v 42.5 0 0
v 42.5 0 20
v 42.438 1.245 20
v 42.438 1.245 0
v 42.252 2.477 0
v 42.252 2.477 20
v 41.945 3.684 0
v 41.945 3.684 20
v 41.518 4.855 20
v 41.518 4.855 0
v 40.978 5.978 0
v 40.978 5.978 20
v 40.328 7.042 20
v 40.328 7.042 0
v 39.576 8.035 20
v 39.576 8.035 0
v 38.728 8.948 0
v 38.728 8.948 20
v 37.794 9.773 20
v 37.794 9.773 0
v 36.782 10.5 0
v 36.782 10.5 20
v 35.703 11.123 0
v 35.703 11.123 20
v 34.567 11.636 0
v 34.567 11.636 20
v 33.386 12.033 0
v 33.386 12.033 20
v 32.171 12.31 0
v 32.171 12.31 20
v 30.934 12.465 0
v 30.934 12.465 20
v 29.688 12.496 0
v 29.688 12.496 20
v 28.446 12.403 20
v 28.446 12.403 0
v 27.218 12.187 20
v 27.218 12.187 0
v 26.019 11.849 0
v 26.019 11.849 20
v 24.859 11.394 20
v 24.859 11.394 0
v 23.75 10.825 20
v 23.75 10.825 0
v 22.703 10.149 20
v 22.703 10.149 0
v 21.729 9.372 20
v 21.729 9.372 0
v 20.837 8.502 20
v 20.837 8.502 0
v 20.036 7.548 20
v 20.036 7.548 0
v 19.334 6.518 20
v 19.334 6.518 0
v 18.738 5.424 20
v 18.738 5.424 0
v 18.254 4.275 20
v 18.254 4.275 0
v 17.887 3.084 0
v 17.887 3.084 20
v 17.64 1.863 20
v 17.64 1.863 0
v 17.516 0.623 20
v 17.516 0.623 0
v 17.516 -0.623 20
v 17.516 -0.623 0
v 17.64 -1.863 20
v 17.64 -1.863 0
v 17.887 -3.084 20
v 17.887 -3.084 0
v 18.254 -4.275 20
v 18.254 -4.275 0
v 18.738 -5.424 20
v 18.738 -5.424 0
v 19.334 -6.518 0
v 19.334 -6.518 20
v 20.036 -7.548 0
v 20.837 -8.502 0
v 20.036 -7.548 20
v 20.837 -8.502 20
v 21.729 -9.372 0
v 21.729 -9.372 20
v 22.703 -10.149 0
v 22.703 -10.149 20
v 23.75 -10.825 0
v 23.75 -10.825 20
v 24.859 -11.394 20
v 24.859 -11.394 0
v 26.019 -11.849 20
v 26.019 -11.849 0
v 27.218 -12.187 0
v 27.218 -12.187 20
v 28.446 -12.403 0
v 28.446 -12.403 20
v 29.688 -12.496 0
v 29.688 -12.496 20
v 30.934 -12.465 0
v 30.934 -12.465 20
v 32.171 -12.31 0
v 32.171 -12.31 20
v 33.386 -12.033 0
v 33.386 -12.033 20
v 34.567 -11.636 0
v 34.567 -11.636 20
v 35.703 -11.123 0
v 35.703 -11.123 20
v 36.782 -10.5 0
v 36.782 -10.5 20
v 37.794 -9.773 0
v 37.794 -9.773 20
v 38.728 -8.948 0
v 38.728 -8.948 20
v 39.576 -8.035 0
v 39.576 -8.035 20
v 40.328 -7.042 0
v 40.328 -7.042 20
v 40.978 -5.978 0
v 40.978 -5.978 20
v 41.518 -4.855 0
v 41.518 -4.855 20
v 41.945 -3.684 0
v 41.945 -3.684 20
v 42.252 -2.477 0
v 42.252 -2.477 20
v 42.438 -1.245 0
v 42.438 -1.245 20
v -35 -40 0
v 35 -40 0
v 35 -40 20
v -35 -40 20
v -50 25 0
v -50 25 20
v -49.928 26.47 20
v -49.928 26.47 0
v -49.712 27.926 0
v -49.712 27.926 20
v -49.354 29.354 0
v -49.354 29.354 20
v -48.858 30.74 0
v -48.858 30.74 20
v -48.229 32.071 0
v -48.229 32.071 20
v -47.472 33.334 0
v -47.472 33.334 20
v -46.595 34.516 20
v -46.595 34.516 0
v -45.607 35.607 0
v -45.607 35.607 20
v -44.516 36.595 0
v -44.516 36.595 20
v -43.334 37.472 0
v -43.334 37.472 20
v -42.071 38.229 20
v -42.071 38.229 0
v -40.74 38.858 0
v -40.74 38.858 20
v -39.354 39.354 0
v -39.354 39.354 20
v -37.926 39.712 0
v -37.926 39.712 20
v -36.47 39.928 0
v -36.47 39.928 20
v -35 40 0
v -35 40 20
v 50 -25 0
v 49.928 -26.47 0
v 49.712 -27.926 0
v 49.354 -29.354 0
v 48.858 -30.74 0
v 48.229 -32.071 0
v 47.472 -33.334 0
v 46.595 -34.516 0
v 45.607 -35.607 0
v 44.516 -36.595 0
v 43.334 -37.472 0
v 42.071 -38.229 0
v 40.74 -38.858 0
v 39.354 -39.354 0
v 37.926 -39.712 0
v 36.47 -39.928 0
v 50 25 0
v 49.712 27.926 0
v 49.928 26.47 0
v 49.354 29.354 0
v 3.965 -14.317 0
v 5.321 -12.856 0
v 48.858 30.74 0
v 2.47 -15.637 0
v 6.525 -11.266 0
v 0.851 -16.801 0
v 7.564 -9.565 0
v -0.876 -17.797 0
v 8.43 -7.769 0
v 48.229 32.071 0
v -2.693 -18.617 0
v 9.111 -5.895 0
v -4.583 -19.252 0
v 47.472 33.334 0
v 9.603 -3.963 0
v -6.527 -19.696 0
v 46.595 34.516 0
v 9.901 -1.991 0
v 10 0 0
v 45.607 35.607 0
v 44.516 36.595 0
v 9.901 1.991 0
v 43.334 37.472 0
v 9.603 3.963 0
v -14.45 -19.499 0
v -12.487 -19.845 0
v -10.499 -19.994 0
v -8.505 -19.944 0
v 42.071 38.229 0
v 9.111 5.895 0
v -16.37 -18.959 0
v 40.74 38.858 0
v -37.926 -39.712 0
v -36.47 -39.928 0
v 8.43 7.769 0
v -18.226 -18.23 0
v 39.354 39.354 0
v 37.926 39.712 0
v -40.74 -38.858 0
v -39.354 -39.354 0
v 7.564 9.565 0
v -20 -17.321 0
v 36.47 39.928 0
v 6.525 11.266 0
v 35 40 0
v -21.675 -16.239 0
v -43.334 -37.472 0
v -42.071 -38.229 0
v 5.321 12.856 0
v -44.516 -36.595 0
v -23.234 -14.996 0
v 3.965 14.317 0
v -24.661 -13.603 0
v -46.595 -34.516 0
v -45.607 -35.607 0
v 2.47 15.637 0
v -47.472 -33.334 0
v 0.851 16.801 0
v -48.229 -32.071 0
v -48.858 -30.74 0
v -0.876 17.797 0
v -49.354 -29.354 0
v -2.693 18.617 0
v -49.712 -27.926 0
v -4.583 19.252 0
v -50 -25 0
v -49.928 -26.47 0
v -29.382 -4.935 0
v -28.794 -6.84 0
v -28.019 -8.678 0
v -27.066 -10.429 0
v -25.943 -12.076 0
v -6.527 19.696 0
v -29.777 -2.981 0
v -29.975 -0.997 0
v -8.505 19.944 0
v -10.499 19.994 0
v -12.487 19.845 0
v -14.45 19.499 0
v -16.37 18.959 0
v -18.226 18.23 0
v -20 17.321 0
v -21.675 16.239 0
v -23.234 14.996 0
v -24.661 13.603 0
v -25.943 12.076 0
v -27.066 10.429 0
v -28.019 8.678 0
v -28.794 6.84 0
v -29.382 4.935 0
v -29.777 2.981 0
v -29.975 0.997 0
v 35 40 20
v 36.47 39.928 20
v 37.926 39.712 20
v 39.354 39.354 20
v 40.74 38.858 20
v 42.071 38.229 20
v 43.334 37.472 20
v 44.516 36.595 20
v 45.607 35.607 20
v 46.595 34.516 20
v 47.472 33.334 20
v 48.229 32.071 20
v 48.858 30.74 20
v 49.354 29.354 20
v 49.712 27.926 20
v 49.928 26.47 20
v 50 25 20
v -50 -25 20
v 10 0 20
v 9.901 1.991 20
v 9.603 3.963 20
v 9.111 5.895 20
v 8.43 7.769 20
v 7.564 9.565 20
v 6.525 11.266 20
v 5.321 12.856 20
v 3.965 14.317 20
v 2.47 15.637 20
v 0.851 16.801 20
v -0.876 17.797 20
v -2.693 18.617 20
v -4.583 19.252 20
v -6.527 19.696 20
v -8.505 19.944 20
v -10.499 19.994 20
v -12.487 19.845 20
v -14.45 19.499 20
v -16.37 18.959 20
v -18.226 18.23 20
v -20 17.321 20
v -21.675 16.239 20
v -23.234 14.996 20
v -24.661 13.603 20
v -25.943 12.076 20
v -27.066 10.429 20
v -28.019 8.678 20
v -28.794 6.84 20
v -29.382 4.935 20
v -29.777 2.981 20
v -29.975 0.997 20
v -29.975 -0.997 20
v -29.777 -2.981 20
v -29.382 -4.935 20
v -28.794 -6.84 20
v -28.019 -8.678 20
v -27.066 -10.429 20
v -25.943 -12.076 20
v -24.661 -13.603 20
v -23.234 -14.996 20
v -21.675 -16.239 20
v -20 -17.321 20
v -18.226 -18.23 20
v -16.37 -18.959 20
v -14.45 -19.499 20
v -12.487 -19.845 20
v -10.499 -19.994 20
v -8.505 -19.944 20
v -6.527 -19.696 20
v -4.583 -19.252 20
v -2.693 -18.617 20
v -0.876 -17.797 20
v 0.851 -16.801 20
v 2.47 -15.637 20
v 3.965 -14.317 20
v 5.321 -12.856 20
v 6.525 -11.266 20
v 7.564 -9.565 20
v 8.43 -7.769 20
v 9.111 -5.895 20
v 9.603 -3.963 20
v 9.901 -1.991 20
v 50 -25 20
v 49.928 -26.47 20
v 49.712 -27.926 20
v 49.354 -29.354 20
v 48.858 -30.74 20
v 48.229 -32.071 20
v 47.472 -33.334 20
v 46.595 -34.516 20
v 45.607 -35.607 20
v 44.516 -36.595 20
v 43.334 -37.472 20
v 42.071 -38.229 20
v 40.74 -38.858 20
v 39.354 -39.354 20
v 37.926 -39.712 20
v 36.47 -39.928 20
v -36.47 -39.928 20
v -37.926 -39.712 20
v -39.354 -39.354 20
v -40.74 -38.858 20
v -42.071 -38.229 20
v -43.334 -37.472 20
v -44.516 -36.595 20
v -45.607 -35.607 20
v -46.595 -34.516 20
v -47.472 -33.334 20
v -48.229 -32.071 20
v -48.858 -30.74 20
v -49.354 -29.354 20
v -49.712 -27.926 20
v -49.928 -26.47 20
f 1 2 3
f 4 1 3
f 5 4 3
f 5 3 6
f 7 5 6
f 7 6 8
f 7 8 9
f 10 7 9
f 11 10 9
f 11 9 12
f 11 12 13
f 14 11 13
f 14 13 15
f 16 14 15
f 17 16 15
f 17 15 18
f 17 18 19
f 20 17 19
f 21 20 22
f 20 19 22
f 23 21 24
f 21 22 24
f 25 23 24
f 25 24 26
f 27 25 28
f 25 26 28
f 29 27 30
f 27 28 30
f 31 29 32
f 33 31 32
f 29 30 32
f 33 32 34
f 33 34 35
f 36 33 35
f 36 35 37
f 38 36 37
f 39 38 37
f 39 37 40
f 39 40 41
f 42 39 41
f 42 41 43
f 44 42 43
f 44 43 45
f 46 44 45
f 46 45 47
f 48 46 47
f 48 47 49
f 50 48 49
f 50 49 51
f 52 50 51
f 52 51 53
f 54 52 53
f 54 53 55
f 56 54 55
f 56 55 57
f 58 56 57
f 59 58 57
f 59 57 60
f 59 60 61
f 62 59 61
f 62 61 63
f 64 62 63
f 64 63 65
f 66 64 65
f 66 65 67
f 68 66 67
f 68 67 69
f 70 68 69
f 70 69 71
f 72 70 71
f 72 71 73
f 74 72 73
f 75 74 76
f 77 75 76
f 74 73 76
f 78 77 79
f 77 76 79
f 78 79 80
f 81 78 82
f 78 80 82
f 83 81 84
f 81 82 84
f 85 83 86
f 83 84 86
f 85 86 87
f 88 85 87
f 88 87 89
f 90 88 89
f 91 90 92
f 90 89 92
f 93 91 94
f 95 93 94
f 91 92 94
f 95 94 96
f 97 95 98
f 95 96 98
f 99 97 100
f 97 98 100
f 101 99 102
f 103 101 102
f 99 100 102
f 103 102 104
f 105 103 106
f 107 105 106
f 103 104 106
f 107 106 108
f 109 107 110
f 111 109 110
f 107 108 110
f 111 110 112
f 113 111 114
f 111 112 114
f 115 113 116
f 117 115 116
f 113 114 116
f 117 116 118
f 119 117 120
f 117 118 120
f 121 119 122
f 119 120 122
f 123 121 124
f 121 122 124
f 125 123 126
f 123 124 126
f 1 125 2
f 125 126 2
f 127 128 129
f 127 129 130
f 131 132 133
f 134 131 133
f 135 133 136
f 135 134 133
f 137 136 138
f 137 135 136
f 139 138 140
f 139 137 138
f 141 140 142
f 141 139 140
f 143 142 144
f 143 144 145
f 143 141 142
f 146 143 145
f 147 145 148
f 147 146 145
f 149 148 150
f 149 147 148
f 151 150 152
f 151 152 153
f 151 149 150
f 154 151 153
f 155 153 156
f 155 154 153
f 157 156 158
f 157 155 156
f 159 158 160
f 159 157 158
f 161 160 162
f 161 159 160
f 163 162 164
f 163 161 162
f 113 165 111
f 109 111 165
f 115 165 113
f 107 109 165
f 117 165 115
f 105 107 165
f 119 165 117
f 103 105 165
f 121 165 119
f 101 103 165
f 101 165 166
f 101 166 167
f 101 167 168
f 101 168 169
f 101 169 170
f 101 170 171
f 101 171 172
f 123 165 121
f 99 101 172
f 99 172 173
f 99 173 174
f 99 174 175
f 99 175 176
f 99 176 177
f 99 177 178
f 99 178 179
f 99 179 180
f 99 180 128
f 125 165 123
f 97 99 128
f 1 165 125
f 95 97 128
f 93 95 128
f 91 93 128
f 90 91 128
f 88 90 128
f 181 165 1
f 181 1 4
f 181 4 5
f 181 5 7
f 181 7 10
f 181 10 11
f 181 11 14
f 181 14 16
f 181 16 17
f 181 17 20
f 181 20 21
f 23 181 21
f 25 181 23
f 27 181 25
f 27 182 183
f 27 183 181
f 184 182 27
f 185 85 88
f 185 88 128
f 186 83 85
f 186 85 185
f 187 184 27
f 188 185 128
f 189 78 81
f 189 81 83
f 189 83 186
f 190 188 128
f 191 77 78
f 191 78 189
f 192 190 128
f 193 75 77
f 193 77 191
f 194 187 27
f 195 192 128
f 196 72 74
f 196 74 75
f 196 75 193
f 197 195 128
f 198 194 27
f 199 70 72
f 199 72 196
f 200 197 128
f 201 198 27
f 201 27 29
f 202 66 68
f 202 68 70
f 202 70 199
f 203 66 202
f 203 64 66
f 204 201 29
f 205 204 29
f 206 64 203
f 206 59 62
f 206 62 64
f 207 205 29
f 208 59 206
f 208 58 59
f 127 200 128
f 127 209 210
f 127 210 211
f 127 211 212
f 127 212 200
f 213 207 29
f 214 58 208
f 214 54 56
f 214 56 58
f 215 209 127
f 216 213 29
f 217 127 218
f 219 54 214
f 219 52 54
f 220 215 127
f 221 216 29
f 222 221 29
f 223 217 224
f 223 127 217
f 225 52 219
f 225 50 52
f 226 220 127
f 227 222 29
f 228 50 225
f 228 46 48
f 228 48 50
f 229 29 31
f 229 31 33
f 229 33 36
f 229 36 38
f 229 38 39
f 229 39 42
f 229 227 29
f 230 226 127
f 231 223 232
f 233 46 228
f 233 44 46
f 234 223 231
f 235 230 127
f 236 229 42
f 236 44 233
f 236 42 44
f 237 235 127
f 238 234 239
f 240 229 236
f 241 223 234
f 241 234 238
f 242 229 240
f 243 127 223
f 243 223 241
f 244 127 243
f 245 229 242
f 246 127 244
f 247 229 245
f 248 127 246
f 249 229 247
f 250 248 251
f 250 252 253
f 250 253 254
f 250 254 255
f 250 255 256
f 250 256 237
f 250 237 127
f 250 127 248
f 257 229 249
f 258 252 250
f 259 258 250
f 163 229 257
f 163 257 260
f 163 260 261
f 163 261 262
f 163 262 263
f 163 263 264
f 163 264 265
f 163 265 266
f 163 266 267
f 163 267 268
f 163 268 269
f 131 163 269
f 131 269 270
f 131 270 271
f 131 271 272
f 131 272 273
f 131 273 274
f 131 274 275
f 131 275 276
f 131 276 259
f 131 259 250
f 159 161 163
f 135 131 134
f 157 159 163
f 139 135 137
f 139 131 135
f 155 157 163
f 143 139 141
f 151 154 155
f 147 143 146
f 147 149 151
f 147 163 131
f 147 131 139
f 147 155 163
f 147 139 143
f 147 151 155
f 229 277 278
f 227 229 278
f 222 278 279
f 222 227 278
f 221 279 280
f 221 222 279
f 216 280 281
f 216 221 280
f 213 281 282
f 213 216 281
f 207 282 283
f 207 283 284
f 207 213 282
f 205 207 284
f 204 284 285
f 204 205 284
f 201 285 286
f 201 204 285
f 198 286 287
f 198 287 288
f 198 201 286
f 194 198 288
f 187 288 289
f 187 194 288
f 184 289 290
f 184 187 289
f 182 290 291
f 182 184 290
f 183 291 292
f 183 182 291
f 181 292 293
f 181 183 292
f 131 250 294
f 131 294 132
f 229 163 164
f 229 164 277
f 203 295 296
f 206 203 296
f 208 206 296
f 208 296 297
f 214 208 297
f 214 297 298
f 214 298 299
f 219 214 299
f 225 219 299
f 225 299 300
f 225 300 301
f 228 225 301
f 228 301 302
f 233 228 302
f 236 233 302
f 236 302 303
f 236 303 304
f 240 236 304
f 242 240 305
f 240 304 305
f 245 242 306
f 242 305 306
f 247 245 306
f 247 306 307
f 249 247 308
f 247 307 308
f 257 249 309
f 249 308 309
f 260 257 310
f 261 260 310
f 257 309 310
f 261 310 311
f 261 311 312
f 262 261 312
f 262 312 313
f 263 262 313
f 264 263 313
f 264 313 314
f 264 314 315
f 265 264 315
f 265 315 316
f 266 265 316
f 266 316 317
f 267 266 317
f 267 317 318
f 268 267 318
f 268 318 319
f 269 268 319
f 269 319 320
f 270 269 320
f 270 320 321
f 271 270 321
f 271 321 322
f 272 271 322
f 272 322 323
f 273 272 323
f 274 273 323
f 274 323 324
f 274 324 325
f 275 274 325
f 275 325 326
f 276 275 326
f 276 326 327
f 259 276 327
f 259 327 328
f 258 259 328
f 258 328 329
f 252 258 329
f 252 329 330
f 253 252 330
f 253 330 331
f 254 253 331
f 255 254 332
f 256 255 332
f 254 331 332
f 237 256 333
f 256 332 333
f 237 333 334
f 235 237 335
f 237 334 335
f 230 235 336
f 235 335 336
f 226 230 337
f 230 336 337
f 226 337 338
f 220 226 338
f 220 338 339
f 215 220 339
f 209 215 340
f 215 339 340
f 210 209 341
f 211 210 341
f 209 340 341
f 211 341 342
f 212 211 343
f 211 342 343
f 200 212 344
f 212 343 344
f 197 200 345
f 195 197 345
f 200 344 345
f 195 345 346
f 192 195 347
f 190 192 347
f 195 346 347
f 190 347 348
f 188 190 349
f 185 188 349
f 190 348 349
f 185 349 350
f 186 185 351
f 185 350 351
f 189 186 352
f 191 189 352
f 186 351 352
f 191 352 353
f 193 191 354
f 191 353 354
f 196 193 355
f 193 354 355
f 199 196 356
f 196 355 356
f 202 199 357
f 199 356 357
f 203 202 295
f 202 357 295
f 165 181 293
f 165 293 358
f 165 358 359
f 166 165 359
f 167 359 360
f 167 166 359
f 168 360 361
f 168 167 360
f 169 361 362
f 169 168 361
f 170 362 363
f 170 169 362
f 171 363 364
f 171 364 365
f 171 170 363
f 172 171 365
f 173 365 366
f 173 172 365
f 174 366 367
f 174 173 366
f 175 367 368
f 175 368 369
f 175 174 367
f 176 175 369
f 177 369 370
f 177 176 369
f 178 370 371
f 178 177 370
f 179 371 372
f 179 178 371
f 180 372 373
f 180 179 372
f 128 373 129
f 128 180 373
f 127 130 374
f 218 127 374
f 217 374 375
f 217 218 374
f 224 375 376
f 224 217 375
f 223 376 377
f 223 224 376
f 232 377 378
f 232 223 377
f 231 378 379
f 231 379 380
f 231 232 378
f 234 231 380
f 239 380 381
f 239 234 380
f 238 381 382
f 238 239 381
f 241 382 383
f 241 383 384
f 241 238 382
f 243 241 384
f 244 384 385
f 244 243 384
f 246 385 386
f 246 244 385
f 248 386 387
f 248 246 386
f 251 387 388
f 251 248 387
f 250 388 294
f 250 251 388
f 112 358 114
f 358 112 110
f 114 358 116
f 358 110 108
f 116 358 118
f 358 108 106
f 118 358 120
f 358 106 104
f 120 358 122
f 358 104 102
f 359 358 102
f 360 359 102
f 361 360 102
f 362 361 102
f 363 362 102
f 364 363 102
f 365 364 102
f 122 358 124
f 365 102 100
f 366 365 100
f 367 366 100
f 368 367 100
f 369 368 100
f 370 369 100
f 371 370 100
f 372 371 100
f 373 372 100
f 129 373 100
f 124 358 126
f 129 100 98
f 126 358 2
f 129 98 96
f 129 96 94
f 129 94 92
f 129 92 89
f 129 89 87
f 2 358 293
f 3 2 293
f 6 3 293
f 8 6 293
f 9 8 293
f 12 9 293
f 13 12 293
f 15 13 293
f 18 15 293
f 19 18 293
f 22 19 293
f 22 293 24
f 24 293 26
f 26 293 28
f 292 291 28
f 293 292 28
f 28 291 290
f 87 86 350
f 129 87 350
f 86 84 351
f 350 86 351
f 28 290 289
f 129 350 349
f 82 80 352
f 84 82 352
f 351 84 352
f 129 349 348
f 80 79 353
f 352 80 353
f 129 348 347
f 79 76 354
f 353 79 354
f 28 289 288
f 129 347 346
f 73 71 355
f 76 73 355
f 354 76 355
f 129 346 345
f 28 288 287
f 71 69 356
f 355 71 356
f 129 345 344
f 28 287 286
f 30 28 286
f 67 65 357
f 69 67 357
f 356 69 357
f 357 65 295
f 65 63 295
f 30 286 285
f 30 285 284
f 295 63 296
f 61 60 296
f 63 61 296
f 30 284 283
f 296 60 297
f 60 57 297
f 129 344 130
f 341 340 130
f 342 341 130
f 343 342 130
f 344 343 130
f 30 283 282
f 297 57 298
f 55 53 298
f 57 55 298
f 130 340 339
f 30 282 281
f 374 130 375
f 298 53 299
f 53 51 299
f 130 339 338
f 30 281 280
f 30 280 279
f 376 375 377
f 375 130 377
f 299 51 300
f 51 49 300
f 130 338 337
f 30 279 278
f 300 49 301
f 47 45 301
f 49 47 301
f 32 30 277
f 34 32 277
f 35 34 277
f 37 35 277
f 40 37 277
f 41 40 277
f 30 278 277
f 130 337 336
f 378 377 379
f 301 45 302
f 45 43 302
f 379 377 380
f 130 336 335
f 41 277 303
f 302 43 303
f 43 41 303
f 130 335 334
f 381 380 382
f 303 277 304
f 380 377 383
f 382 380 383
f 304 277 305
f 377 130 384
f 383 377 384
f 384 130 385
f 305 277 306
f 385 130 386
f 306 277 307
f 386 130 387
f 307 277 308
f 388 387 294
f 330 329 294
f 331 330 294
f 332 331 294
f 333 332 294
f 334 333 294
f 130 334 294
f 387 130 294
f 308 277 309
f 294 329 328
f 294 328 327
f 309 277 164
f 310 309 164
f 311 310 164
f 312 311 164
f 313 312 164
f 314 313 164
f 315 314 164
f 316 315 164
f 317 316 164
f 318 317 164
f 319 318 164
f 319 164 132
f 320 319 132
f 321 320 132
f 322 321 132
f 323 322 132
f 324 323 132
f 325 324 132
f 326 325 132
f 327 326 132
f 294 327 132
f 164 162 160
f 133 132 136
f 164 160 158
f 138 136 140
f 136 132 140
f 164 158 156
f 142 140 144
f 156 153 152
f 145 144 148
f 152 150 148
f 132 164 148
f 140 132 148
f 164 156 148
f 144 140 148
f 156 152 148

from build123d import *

# Parameters (mm, degrees)
BOSS_EXTRUDE1_DEPTH     = 20
SKETCH3_R               = 20
CUT_EXTRUDE2_DEPTH      = 1
CUT_EXTRUDE2_DEPTH_BACK = 21
SKETCH4_R               = 12.5
CUT_EXTRUDE3_DEPTH      = 21


with BuildPart() as part:
    # Sketch1 → Boss-Extrude1 (new body)
    with BuildSketch(Plane.XY):
        with BuildLine():
            Line((35, -40), (-35, -40))
            ThreePointArc((-35, -40), (-45.606601718, -35.606601718), (-50, -25))
            Line((-50, -25), (-50, 25))
            ThreePointArc((-50, 25), (-45.606601718, 35.606601718), (-35, 40))
            Line((-35, 40), (35, 40))
            ThreePointArc((35, 40), (45.606601718, 35.606601718), (50, 25))
            Line((50, 25), (50, -25))
            ThreePointArc((50, -25), (45.606601718, -35.606601718), (35, -40))
        make_face()
    extrude(amount=BOSS_EXTRUDE1_DEPTH)

    # Sketch3 → Cut-Extrude2 (cut, two sides)
    with BuildSketch(Plane.XY.offset(20)) as cut_extrude2_sk:
        with Locations((-10, 0)):
            Circle(SKETCH3_R)
    extrude(amount=CUT_EXTRUDE2_DEPTH, mode=Mode.SUBTRACT)
    extrude(cut_extrude2_sk.sketch, amount=-CUT_EXTRUDE2_DEPTH_BACK, mode=Mode.SUBTRACT)

    # Sketch4 → Cut-Extrude3 (cut, through all)
    with BuildSketch(Plane.XY.offset(20)):
        with Locations((30, 0)):
            Circle(SKETCH4_R)
    extrude(amount=-CUT_EXTRUDE3_DEPTH, mode=Mode.SUBTRACT)


solid = part.part
